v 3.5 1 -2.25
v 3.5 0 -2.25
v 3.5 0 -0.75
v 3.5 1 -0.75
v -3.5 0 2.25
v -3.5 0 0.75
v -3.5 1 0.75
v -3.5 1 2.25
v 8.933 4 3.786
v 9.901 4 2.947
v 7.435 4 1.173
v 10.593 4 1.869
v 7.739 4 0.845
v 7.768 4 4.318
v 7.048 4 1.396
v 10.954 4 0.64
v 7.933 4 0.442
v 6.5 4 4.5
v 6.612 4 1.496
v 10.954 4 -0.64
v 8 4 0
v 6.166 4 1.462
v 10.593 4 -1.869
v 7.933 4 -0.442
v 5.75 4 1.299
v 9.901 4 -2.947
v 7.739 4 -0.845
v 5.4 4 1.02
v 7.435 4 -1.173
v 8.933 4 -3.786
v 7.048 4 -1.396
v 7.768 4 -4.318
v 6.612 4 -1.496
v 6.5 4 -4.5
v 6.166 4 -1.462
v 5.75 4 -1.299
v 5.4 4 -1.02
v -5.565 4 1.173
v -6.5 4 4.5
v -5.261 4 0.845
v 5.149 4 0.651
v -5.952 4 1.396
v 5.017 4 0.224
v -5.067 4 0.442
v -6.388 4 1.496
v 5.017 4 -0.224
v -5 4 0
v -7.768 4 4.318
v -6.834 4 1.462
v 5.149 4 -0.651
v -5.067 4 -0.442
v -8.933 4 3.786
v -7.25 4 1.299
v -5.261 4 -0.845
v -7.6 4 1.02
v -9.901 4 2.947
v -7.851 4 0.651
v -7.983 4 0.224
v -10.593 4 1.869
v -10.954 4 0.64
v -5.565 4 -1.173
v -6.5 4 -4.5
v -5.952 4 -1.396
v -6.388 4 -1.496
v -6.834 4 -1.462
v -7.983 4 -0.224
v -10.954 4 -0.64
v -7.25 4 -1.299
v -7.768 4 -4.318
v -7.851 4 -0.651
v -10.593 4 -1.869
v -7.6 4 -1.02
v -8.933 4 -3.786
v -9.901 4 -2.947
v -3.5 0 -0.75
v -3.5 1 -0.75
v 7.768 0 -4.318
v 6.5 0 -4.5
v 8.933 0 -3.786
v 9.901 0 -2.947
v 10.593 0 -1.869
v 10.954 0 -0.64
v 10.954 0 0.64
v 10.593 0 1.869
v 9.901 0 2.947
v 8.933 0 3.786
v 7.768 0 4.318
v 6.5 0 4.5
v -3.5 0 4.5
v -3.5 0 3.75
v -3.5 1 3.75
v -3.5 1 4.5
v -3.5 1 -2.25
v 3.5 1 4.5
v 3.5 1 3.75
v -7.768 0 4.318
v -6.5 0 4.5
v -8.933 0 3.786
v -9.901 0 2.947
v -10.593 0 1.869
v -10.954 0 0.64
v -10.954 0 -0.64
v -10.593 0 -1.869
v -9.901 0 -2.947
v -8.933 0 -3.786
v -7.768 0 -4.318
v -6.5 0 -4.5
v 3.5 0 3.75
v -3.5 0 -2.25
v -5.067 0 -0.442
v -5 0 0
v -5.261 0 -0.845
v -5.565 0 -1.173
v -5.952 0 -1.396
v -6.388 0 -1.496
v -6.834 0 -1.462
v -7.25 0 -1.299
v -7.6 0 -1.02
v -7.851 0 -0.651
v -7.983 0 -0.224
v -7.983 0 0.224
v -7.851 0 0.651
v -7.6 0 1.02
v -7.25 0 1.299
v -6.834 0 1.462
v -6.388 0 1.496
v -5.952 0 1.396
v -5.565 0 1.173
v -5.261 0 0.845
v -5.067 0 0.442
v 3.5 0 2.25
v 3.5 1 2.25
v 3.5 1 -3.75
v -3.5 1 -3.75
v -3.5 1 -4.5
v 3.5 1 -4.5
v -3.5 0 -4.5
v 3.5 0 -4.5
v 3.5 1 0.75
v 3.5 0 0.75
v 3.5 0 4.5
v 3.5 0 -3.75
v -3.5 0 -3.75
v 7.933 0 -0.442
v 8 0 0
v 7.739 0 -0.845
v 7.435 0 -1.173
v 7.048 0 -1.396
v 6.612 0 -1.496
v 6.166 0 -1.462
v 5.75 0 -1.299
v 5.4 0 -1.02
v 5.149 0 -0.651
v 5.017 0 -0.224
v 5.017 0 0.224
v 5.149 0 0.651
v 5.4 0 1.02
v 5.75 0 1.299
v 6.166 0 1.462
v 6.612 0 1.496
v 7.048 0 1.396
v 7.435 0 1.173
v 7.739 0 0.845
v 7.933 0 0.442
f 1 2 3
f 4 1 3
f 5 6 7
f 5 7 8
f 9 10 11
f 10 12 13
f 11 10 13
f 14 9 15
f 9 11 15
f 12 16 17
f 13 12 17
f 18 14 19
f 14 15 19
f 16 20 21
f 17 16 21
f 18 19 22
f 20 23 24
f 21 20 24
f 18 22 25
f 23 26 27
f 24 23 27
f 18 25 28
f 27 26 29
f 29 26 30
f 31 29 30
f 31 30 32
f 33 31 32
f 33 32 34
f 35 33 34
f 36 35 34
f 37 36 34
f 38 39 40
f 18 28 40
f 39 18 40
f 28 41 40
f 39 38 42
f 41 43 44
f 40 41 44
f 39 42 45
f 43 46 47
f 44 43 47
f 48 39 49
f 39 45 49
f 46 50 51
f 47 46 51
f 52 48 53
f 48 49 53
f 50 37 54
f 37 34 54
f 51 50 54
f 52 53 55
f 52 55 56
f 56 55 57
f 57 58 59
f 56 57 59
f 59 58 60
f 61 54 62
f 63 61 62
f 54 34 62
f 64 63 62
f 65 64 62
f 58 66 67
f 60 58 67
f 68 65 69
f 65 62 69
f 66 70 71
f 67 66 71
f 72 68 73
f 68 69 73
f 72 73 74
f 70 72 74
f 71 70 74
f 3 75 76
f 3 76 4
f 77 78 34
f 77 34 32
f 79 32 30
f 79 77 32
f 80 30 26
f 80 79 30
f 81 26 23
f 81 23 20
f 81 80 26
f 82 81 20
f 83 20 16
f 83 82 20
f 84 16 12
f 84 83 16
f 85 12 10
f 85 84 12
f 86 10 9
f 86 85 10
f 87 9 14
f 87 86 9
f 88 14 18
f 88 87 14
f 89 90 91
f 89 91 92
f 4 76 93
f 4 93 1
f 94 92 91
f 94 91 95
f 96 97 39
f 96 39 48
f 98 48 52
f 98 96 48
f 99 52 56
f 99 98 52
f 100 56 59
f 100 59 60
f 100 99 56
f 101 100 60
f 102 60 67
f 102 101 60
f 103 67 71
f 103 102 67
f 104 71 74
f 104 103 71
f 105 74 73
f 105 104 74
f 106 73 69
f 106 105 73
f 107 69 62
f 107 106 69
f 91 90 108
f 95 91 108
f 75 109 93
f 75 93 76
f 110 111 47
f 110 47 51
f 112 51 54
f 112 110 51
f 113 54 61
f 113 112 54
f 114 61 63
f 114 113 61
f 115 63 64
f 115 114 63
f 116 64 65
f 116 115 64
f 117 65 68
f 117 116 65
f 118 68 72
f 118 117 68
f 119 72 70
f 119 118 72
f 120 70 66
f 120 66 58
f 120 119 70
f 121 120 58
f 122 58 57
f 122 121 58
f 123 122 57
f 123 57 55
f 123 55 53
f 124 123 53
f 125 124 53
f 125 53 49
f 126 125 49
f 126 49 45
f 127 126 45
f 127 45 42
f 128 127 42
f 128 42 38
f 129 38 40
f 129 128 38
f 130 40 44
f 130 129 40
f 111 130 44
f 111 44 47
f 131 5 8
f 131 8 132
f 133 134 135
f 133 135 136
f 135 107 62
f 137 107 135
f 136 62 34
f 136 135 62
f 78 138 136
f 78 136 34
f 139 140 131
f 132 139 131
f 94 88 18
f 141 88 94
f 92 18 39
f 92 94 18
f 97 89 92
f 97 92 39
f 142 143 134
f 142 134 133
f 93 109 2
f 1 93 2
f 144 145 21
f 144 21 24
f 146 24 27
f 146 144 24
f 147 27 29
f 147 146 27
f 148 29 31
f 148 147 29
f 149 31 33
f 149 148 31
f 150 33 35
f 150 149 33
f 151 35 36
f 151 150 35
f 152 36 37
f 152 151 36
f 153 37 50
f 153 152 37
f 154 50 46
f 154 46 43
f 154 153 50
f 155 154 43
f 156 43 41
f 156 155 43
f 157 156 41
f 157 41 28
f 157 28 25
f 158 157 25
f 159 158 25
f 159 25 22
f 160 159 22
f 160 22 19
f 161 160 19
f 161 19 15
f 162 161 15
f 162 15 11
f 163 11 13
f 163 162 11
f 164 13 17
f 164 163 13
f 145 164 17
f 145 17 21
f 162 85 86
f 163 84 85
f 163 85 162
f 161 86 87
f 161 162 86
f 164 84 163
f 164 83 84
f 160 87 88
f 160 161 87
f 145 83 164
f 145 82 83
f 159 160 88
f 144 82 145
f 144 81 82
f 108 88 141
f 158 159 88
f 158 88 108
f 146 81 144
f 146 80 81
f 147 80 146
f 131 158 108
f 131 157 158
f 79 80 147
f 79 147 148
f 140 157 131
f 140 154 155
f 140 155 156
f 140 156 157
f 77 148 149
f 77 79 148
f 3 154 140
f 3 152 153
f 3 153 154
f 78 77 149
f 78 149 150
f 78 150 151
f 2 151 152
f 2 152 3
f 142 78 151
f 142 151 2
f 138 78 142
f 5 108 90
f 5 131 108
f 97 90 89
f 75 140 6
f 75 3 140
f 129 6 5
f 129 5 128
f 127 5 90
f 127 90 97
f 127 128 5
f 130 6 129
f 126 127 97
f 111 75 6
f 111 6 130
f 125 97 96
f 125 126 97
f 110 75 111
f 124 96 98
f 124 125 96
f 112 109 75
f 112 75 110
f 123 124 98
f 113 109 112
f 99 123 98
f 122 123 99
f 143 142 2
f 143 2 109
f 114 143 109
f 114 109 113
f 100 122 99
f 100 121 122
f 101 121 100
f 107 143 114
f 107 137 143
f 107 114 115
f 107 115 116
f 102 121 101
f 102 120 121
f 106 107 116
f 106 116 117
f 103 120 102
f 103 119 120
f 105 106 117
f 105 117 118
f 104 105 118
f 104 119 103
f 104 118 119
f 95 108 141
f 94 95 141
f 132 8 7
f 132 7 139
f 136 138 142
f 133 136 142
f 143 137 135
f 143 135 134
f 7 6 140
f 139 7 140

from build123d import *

# Parameters (mm, degrees)
SKETCH1_R      = 1.5
EXTRUDE1_DEPTH = 4
SKETCH2_W      = 7
SKETCH2_H      = 0.75
SKETCH2_H_2    = 1.5
EXTRUDE4_DEPTH = 1


with BuildPart() as part:
    # Sketch1 → Extrude1 (new body)
    with BuildSketch(Plane(origin=(0, 0, 0), x_dir=(1, 0, 0), z_dir=(0, 1, 0))):
        with BuildLine():
            Line((-6.5, 4.5), (6.5, 4.5))
            ThreePointArc((6.5, 4.5), (11, 0), (6.5, -4.5))
            Line((6.5, -4.5), (-6.5, -4.5))
            ThreePointArc((-6.5, -4.5), (-11, 0), (-6.5, 4.5))
        make_face()
        with Locations((6.5, 0)):
            Circle(SKETCH1_R, mode=Mode.SUBTRACT)
        with Locations((-6.5, 0)):
            Circle(SKETCH1_R, mode=Mode.SUBTRACT)
    extrude(amount=EXTRUDE1_DEPTH)

    # Sketch2 → Extrude4 (cut)
    with BuildSketch(Plane.XZ):
        with Locations((0, -4.125)):
            Rectangle(SKETCH2_W, SKETCH2_H)
        with Locations((0, -1.5)):
            Rectangle(SKETCH2_W, SKETCH2_H_2)
        with Locations((0, 1.5)):
            Rectangle(SKETCH2_W, SKETCH2_H_2)
        with Locations((0, 4.125)):
            Rectangle(SKETCH2_W, SKETCH2_H)
    extrude(amount=-EXTRUDE4_DEPTH, mode=Mode.SUBTRACT)


solid = part.part
